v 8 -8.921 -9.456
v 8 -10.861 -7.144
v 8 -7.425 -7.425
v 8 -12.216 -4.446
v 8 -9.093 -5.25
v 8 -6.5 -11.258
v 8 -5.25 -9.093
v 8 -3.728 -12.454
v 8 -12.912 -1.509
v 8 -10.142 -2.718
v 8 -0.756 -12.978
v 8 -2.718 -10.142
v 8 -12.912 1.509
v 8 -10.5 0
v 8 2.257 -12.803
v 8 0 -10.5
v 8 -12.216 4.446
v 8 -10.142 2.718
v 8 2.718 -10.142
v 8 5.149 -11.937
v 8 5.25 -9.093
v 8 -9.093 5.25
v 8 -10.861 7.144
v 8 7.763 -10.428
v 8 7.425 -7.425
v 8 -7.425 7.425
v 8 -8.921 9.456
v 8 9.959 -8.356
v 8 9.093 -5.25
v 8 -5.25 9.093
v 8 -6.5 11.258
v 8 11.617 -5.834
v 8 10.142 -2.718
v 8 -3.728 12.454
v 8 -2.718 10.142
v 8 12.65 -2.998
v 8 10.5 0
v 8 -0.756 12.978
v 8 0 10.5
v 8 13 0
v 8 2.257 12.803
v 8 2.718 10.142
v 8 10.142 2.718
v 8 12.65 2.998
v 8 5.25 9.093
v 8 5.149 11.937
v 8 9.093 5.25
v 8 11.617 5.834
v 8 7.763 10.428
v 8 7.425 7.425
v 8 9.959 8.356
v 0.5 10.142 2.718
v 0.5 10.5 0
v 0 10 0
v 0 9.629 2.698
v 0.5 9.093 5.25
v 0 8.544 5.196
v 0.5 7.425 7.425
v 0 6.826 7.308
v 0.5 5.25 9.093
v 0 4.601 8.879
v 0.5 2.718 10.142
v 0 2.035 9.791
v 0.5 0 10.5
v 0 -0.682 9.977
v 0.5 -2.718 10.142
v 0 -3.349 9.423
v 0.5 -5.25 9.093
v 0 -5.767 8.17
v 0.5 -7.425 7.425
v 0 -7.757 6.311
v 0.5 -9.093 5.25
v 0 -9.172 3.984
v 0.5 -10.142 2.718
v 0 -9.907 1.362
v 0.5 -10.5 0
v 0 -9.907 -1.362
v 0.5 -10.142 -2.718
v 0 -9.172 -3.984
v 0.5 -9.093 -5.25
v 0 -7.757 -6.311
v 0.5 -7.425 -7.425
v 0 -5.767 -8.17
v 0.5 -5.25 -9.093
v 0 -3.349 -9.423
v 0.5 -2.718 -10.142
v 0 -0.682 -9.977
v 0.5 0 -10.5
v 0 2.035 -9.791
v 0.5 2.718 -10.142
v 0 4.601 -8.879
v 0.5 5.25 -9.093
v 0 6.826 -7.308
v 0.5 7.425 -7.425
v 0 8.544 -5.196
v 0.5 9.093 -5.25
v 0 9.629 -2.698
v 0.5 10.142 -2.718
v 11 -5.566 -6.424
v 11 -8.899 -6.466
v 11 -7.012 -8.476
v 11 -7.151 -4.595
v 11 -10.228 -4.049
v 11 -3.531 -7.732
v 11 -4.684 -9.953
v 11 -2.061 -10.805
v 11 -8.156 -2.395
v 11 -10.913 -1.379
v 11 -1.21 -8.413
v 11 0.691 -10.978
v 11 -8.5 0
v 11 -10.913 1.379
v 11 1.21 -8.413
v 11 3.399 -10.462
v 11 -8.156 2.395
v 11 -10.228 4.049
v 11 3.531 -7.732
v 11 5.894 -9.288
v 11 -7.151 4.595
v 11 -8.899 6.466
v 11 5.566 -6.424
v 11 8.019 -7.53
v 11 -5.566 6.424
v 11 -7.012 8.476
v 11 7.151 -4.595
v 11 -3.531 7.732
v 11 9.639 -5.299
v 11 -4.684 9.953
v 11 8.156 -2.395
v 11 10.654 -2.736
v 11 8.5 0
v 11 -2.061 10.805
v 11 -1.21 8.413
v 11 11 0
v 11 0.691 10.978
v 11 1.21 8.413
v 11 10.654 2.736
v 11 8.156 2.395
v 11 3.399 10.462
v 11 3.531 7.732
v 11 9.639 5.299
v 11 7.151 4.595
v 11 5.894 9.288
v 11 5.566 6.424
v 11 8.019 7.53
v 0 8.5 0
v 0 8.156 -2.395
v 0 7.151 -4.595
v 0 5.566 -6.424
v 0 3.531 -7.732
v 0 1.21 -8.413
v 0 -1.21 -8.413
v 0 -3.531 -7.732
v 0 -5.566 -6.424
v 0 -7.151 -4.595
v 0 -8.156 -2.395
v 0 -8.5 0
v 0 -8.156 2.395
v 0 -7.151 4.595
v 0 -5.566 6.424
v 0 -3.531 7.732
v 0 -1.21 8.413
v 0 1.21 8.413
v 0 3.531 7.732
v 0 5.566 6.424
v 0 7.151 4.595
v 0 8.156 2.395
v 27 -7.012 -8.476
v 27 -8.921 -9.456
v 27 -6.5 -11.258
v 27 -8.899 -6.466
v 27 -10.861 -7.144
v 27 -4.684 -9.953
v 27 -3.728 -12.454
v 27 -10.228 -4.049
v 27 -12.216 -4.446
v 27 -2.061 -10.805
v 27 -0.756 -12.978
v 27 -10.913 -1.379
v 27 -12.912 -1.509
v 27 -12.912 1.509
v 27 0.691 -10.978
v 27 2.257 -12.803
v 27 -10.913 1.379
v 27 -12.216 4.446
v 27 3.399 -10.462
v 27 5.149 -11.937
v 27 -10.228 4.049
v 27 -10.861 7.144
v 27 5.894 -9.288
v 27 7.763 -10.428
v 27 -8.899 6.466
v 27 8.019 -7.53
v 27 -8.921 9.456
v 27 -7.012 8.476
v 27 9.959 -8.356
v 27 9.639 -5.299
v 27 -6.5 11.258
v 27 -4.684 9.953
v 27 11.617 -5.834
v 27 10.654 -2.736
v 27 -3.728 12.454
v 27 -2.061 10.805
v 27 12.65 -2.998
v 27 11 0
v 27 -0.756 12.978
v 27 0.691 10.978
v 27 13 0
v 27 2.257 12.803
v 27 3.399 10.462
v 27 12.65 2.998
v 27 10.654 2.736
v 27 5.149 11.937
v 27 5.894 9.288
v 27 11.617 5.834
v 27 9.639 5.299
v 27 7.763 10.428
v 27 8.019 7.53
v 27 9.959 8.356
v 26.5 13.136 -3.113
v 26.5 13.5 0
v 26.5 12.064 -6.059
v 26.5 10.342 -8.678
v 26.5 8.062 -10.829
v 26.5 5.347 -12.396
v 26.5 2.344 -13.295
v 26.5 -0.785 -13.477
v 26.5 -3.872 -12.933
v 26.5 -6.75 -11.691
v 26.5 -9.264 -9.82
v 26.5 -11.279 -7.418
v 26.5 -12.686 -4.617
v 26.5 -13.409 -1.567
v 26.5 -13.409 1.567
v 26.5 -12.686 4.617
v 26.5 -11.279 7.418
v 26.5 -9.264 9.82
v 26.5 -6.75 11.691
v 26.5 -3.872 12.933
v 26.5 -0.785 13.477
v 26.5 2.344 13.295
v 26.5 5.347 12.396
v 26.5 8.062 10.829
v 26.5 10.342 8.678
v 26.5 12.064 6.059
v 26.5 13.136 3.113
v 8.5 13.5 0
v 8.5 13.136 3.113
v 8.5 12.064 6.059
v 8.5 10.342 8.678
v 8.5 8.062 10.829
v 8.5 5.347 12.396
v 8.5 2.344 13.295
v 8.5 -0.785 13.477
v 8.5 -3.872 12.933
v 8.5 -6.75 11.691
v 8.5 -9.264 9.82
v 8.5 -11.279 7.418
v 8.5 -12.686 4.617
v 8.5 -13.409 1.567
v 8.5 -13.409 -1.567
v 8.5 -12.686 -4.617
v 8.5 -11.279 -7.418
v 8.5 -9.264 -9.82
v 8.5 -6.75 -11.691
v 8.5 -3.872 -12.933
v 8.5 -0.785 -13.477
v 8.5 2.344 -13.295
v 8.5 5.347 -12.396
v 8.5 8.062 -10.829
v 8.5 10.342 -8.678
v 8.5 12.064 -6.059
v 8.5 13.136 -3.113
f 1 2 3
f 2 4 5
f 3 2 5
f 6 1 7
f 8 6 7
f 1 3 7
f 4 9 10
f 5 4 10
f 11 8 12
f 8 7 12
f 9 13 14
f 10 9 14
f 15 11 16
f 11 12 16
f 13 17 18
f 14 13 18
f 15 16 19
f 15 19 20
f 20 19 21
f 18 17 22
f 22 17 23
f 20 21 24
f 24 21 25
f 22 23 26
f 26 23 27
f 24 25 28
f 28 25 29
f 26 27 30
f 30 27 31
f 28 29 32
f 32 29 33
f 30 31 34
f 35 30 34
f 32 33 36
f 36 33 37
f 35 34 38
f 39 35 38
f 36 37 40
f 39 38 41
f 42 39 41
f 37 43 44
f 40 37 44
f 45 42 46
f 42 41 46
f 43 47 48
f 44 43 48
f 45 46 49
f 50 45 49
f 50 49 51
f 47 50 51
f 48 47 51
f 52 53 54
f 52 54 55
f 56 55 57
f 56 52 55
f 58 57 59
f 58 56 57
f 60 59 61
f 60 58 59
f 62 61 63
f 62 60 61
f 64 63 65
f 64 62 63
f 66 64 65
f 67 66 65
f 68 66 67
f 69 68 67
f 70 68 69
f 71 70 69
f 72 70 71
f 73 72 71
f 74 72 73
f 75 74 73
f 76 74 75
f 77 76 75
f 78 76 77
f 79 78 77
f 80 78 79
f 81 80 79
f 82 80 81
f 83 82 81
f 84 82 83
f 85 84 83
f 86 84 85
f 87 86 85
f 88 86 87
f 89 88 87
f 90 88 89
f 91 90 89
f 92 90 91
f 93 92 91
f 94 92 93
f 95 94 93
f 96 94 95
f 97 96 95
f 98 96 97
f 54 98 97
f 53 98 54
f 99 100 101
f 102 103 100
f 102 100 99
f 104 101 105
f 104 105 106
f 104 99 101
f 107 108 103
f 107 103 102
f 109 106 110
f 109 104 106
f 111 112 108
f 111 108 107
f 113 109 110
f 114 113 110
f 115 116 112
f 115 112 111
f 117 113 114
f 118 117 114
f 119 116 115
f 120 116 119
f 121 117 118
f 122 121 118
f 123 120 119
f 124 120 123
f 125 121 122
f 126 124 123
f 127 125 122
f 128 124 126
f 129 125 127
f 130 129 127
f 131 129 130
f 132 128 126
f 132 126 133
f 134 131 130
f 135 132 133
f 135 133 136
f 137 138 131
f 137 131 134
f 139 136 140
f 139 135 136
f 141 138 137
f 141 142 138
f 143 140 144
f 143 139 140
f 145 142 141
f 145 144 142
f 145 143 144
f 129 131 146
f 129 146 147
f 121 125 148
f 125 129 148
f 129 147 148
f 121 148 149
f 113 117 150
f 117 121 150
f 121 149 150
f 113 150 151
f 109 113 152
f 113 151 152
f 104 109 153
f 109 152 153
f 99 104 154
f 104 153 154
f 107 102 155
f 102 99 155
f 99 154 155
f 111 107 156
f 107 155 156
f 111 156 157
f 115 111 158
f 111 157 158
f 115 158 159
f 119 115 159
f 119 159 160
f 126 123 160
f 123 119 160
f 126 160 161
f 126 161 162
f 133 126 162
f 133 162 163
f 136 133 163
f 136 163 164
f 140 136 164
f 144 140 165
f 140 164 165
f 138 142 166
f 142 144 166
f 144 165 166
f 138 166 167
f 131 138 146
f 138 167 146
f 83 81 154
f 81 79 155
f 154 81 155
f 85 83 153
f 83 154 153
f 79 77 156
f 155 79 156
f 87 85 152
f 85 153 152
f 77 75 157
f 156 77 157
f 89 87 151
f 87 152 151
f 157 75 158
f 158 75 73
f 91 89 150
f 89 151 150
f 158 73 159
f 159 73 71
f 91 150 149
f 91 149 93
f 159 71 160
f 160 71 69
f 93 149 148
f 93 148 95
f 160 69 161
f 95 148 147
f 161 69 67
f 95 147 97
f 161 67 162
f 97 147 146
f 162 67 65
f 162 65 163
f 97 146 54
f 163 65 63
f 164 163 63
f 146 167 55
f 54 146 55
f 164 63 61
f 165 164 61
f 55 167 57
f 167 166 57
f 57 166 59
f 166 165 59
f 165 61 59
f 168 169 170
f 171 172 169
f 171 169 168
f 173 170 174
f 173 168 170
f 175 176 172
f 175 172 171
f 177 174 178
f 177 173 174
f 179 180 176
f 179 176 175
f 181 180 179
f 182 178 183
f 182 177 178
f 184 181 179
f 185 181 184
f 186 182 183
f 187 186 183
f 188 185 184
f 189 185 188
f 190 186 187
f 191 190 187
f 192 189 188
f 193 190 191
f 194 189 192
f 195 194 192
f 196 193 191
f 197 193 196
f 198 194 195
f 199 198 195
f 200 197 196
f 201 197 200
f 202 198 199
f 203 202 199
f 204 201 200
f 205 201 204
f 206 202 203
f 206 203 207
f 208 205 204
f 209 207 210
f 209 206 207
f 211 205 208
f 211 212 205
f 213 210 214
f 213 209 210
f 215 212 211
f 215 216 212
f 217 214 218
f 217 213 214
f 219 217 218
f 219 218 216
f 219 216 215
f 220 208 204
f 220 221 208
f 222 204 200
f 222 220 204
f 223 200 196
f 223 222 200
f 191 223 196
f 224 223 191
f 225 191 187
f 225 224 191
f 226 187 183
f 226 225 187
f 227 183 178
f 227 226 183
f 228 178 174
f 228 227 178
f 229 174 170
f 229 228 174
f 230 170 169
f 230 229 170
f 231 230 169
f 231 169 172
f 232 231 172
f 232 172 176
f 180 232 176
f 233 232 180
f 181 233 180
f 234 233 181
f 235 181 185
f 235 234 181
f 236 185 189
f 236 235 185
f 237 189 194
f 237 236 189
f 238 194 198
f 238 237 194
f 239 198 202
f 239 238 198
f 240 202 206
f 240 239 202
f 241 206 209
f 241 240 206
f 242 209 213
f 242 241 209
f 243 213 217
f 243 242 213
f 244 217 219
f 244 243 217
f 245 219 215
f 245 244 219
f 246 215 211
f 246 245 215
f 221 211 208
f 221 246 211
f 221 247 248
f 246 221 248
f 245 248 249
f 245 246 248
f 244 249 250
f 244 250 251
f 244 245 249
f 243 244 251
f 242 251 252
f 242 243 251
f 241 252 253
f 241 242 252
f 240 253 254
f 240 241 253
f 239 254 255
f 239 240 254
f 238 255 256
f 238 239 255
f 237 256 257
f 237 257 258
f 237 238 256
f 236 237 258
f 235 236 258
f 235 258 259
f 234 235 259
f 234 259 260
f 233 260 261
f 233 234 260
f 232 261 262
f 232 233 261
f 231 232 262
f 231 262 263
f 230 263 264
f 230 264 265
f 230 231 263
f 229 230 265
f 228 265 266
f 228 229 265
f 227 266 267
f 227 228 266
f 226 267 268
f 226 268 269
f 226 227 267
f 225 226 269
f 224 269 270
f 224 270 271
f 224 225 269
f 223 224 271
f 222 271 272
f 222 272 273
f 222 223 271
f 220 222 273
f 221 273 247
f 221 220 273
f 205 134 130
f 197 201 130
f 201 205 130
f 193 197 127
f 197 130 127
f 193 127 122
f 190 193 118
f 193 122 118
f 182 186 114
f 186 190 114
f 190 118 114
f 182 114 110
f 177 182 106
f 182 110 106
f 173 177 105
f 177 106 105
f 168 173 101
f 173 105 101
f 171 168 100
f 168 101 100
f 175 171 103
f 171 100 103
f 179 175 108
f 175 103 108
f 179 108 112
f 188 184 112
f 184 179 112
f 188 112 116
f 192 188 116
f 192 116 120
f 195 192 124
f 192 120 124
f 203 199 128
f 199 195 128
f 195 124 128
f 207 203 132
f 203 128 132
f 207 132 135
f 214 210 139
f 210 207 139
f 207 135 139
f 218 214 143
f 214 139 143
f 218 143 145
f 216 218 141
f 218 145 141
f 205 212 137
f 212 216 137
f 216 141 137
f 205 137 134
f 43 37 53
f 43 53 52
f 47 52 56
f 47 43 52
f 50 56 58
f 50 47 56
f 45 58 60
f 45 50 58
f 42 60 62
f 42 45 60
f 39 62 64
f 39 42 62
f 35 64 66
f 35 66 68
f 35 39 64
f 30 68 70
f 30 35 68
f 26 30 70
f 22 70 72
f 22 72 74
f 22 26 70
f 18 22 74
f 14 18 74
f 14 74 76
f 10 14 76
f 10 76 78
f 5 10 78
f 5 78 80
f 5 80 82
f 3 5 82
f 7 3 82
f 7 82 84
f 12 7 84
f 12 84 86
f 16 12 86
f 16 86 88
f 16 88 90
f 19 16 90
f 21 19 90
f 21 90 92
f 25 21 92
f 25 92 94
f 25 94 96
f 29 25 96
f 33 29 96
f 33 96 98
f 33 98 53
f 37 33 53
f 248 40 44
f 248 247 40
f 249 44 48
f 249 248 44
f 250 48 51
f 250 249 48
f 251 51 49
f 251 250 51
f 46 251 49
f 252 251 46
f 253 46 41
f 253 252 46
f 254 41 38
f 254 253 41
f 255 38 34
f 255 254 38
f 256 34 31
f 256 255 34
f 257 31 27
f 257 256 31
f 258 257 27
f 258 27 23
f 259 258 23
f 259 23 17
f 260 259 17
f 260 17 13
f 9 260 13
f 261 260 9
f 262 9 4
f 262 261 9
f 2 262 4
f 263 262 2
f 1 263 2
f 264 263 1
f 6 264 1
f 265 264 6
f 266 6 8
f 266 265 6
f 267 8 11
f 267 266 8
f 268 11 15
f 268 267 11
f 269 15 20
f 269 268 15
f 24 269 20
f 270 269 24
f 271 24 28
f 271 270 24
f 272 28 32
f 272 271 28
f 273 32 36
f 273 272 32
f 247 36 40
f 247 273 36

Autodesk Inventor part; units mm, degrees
ref_plane "YZ Plane" through (0, 0, 0) normal (1, 0, 0) x (0, 1, 0)
ref_plane "XZ Plane" through (0, 0, 0) normal (0, 1, 0) x (-1, 0, 0)
ref_plane "XY Plane" through (0, 0, 0) normal (0, 0, 1) x (1, 0, 0)
sketch "Sketch1" plane through (0, 0, 0) normal (0, 0, 1) x (1, 0, 0)
  line L0 (0, 0) -> (5, 0)
  line L1 (0, 8.5) -> (0, 10.5)
  line L2 (0, 10.5) -> (8, 10.5)
  line L3 (8, 10.5) -> (8, 13.5)
  line L4 (8, 13.5) -> (27, 13.5)
  line L5 (27, 13.5) -> (27, 11)
  line L6 (27, 11) -> (11, 11)
  line L7 (11, 11) -> (11, 8.5)
  line L8 (11, 8.5) -> (0, 8.5)
  dimension "d0" = 5
  dimension "d1" = 8.5
  dimension "d2" = 2
  dimension "d3" = 8
  dimension "d4" = 3
  dimension "d5" = 19
  dimension "d6" = 2.5
  dimension "d7" = 16
  dimension "d8" = 11
  dimension "d15" = 3
revolve "Revolution1" add sketch "Sketch1" angle 360 about axis through (0, 0, 0) along (1, 0, 0)
chamfer "Chamfer1" distance 0.5 angle 45 3 edges at (27, -13.5, 0) (8, -13.5, 0) (0, -10.5, 0)
thread "Thread1" size "M16x1" class "6H" standard "ANSI Metric M Profile" full length
properties part number "logement roue libre"
